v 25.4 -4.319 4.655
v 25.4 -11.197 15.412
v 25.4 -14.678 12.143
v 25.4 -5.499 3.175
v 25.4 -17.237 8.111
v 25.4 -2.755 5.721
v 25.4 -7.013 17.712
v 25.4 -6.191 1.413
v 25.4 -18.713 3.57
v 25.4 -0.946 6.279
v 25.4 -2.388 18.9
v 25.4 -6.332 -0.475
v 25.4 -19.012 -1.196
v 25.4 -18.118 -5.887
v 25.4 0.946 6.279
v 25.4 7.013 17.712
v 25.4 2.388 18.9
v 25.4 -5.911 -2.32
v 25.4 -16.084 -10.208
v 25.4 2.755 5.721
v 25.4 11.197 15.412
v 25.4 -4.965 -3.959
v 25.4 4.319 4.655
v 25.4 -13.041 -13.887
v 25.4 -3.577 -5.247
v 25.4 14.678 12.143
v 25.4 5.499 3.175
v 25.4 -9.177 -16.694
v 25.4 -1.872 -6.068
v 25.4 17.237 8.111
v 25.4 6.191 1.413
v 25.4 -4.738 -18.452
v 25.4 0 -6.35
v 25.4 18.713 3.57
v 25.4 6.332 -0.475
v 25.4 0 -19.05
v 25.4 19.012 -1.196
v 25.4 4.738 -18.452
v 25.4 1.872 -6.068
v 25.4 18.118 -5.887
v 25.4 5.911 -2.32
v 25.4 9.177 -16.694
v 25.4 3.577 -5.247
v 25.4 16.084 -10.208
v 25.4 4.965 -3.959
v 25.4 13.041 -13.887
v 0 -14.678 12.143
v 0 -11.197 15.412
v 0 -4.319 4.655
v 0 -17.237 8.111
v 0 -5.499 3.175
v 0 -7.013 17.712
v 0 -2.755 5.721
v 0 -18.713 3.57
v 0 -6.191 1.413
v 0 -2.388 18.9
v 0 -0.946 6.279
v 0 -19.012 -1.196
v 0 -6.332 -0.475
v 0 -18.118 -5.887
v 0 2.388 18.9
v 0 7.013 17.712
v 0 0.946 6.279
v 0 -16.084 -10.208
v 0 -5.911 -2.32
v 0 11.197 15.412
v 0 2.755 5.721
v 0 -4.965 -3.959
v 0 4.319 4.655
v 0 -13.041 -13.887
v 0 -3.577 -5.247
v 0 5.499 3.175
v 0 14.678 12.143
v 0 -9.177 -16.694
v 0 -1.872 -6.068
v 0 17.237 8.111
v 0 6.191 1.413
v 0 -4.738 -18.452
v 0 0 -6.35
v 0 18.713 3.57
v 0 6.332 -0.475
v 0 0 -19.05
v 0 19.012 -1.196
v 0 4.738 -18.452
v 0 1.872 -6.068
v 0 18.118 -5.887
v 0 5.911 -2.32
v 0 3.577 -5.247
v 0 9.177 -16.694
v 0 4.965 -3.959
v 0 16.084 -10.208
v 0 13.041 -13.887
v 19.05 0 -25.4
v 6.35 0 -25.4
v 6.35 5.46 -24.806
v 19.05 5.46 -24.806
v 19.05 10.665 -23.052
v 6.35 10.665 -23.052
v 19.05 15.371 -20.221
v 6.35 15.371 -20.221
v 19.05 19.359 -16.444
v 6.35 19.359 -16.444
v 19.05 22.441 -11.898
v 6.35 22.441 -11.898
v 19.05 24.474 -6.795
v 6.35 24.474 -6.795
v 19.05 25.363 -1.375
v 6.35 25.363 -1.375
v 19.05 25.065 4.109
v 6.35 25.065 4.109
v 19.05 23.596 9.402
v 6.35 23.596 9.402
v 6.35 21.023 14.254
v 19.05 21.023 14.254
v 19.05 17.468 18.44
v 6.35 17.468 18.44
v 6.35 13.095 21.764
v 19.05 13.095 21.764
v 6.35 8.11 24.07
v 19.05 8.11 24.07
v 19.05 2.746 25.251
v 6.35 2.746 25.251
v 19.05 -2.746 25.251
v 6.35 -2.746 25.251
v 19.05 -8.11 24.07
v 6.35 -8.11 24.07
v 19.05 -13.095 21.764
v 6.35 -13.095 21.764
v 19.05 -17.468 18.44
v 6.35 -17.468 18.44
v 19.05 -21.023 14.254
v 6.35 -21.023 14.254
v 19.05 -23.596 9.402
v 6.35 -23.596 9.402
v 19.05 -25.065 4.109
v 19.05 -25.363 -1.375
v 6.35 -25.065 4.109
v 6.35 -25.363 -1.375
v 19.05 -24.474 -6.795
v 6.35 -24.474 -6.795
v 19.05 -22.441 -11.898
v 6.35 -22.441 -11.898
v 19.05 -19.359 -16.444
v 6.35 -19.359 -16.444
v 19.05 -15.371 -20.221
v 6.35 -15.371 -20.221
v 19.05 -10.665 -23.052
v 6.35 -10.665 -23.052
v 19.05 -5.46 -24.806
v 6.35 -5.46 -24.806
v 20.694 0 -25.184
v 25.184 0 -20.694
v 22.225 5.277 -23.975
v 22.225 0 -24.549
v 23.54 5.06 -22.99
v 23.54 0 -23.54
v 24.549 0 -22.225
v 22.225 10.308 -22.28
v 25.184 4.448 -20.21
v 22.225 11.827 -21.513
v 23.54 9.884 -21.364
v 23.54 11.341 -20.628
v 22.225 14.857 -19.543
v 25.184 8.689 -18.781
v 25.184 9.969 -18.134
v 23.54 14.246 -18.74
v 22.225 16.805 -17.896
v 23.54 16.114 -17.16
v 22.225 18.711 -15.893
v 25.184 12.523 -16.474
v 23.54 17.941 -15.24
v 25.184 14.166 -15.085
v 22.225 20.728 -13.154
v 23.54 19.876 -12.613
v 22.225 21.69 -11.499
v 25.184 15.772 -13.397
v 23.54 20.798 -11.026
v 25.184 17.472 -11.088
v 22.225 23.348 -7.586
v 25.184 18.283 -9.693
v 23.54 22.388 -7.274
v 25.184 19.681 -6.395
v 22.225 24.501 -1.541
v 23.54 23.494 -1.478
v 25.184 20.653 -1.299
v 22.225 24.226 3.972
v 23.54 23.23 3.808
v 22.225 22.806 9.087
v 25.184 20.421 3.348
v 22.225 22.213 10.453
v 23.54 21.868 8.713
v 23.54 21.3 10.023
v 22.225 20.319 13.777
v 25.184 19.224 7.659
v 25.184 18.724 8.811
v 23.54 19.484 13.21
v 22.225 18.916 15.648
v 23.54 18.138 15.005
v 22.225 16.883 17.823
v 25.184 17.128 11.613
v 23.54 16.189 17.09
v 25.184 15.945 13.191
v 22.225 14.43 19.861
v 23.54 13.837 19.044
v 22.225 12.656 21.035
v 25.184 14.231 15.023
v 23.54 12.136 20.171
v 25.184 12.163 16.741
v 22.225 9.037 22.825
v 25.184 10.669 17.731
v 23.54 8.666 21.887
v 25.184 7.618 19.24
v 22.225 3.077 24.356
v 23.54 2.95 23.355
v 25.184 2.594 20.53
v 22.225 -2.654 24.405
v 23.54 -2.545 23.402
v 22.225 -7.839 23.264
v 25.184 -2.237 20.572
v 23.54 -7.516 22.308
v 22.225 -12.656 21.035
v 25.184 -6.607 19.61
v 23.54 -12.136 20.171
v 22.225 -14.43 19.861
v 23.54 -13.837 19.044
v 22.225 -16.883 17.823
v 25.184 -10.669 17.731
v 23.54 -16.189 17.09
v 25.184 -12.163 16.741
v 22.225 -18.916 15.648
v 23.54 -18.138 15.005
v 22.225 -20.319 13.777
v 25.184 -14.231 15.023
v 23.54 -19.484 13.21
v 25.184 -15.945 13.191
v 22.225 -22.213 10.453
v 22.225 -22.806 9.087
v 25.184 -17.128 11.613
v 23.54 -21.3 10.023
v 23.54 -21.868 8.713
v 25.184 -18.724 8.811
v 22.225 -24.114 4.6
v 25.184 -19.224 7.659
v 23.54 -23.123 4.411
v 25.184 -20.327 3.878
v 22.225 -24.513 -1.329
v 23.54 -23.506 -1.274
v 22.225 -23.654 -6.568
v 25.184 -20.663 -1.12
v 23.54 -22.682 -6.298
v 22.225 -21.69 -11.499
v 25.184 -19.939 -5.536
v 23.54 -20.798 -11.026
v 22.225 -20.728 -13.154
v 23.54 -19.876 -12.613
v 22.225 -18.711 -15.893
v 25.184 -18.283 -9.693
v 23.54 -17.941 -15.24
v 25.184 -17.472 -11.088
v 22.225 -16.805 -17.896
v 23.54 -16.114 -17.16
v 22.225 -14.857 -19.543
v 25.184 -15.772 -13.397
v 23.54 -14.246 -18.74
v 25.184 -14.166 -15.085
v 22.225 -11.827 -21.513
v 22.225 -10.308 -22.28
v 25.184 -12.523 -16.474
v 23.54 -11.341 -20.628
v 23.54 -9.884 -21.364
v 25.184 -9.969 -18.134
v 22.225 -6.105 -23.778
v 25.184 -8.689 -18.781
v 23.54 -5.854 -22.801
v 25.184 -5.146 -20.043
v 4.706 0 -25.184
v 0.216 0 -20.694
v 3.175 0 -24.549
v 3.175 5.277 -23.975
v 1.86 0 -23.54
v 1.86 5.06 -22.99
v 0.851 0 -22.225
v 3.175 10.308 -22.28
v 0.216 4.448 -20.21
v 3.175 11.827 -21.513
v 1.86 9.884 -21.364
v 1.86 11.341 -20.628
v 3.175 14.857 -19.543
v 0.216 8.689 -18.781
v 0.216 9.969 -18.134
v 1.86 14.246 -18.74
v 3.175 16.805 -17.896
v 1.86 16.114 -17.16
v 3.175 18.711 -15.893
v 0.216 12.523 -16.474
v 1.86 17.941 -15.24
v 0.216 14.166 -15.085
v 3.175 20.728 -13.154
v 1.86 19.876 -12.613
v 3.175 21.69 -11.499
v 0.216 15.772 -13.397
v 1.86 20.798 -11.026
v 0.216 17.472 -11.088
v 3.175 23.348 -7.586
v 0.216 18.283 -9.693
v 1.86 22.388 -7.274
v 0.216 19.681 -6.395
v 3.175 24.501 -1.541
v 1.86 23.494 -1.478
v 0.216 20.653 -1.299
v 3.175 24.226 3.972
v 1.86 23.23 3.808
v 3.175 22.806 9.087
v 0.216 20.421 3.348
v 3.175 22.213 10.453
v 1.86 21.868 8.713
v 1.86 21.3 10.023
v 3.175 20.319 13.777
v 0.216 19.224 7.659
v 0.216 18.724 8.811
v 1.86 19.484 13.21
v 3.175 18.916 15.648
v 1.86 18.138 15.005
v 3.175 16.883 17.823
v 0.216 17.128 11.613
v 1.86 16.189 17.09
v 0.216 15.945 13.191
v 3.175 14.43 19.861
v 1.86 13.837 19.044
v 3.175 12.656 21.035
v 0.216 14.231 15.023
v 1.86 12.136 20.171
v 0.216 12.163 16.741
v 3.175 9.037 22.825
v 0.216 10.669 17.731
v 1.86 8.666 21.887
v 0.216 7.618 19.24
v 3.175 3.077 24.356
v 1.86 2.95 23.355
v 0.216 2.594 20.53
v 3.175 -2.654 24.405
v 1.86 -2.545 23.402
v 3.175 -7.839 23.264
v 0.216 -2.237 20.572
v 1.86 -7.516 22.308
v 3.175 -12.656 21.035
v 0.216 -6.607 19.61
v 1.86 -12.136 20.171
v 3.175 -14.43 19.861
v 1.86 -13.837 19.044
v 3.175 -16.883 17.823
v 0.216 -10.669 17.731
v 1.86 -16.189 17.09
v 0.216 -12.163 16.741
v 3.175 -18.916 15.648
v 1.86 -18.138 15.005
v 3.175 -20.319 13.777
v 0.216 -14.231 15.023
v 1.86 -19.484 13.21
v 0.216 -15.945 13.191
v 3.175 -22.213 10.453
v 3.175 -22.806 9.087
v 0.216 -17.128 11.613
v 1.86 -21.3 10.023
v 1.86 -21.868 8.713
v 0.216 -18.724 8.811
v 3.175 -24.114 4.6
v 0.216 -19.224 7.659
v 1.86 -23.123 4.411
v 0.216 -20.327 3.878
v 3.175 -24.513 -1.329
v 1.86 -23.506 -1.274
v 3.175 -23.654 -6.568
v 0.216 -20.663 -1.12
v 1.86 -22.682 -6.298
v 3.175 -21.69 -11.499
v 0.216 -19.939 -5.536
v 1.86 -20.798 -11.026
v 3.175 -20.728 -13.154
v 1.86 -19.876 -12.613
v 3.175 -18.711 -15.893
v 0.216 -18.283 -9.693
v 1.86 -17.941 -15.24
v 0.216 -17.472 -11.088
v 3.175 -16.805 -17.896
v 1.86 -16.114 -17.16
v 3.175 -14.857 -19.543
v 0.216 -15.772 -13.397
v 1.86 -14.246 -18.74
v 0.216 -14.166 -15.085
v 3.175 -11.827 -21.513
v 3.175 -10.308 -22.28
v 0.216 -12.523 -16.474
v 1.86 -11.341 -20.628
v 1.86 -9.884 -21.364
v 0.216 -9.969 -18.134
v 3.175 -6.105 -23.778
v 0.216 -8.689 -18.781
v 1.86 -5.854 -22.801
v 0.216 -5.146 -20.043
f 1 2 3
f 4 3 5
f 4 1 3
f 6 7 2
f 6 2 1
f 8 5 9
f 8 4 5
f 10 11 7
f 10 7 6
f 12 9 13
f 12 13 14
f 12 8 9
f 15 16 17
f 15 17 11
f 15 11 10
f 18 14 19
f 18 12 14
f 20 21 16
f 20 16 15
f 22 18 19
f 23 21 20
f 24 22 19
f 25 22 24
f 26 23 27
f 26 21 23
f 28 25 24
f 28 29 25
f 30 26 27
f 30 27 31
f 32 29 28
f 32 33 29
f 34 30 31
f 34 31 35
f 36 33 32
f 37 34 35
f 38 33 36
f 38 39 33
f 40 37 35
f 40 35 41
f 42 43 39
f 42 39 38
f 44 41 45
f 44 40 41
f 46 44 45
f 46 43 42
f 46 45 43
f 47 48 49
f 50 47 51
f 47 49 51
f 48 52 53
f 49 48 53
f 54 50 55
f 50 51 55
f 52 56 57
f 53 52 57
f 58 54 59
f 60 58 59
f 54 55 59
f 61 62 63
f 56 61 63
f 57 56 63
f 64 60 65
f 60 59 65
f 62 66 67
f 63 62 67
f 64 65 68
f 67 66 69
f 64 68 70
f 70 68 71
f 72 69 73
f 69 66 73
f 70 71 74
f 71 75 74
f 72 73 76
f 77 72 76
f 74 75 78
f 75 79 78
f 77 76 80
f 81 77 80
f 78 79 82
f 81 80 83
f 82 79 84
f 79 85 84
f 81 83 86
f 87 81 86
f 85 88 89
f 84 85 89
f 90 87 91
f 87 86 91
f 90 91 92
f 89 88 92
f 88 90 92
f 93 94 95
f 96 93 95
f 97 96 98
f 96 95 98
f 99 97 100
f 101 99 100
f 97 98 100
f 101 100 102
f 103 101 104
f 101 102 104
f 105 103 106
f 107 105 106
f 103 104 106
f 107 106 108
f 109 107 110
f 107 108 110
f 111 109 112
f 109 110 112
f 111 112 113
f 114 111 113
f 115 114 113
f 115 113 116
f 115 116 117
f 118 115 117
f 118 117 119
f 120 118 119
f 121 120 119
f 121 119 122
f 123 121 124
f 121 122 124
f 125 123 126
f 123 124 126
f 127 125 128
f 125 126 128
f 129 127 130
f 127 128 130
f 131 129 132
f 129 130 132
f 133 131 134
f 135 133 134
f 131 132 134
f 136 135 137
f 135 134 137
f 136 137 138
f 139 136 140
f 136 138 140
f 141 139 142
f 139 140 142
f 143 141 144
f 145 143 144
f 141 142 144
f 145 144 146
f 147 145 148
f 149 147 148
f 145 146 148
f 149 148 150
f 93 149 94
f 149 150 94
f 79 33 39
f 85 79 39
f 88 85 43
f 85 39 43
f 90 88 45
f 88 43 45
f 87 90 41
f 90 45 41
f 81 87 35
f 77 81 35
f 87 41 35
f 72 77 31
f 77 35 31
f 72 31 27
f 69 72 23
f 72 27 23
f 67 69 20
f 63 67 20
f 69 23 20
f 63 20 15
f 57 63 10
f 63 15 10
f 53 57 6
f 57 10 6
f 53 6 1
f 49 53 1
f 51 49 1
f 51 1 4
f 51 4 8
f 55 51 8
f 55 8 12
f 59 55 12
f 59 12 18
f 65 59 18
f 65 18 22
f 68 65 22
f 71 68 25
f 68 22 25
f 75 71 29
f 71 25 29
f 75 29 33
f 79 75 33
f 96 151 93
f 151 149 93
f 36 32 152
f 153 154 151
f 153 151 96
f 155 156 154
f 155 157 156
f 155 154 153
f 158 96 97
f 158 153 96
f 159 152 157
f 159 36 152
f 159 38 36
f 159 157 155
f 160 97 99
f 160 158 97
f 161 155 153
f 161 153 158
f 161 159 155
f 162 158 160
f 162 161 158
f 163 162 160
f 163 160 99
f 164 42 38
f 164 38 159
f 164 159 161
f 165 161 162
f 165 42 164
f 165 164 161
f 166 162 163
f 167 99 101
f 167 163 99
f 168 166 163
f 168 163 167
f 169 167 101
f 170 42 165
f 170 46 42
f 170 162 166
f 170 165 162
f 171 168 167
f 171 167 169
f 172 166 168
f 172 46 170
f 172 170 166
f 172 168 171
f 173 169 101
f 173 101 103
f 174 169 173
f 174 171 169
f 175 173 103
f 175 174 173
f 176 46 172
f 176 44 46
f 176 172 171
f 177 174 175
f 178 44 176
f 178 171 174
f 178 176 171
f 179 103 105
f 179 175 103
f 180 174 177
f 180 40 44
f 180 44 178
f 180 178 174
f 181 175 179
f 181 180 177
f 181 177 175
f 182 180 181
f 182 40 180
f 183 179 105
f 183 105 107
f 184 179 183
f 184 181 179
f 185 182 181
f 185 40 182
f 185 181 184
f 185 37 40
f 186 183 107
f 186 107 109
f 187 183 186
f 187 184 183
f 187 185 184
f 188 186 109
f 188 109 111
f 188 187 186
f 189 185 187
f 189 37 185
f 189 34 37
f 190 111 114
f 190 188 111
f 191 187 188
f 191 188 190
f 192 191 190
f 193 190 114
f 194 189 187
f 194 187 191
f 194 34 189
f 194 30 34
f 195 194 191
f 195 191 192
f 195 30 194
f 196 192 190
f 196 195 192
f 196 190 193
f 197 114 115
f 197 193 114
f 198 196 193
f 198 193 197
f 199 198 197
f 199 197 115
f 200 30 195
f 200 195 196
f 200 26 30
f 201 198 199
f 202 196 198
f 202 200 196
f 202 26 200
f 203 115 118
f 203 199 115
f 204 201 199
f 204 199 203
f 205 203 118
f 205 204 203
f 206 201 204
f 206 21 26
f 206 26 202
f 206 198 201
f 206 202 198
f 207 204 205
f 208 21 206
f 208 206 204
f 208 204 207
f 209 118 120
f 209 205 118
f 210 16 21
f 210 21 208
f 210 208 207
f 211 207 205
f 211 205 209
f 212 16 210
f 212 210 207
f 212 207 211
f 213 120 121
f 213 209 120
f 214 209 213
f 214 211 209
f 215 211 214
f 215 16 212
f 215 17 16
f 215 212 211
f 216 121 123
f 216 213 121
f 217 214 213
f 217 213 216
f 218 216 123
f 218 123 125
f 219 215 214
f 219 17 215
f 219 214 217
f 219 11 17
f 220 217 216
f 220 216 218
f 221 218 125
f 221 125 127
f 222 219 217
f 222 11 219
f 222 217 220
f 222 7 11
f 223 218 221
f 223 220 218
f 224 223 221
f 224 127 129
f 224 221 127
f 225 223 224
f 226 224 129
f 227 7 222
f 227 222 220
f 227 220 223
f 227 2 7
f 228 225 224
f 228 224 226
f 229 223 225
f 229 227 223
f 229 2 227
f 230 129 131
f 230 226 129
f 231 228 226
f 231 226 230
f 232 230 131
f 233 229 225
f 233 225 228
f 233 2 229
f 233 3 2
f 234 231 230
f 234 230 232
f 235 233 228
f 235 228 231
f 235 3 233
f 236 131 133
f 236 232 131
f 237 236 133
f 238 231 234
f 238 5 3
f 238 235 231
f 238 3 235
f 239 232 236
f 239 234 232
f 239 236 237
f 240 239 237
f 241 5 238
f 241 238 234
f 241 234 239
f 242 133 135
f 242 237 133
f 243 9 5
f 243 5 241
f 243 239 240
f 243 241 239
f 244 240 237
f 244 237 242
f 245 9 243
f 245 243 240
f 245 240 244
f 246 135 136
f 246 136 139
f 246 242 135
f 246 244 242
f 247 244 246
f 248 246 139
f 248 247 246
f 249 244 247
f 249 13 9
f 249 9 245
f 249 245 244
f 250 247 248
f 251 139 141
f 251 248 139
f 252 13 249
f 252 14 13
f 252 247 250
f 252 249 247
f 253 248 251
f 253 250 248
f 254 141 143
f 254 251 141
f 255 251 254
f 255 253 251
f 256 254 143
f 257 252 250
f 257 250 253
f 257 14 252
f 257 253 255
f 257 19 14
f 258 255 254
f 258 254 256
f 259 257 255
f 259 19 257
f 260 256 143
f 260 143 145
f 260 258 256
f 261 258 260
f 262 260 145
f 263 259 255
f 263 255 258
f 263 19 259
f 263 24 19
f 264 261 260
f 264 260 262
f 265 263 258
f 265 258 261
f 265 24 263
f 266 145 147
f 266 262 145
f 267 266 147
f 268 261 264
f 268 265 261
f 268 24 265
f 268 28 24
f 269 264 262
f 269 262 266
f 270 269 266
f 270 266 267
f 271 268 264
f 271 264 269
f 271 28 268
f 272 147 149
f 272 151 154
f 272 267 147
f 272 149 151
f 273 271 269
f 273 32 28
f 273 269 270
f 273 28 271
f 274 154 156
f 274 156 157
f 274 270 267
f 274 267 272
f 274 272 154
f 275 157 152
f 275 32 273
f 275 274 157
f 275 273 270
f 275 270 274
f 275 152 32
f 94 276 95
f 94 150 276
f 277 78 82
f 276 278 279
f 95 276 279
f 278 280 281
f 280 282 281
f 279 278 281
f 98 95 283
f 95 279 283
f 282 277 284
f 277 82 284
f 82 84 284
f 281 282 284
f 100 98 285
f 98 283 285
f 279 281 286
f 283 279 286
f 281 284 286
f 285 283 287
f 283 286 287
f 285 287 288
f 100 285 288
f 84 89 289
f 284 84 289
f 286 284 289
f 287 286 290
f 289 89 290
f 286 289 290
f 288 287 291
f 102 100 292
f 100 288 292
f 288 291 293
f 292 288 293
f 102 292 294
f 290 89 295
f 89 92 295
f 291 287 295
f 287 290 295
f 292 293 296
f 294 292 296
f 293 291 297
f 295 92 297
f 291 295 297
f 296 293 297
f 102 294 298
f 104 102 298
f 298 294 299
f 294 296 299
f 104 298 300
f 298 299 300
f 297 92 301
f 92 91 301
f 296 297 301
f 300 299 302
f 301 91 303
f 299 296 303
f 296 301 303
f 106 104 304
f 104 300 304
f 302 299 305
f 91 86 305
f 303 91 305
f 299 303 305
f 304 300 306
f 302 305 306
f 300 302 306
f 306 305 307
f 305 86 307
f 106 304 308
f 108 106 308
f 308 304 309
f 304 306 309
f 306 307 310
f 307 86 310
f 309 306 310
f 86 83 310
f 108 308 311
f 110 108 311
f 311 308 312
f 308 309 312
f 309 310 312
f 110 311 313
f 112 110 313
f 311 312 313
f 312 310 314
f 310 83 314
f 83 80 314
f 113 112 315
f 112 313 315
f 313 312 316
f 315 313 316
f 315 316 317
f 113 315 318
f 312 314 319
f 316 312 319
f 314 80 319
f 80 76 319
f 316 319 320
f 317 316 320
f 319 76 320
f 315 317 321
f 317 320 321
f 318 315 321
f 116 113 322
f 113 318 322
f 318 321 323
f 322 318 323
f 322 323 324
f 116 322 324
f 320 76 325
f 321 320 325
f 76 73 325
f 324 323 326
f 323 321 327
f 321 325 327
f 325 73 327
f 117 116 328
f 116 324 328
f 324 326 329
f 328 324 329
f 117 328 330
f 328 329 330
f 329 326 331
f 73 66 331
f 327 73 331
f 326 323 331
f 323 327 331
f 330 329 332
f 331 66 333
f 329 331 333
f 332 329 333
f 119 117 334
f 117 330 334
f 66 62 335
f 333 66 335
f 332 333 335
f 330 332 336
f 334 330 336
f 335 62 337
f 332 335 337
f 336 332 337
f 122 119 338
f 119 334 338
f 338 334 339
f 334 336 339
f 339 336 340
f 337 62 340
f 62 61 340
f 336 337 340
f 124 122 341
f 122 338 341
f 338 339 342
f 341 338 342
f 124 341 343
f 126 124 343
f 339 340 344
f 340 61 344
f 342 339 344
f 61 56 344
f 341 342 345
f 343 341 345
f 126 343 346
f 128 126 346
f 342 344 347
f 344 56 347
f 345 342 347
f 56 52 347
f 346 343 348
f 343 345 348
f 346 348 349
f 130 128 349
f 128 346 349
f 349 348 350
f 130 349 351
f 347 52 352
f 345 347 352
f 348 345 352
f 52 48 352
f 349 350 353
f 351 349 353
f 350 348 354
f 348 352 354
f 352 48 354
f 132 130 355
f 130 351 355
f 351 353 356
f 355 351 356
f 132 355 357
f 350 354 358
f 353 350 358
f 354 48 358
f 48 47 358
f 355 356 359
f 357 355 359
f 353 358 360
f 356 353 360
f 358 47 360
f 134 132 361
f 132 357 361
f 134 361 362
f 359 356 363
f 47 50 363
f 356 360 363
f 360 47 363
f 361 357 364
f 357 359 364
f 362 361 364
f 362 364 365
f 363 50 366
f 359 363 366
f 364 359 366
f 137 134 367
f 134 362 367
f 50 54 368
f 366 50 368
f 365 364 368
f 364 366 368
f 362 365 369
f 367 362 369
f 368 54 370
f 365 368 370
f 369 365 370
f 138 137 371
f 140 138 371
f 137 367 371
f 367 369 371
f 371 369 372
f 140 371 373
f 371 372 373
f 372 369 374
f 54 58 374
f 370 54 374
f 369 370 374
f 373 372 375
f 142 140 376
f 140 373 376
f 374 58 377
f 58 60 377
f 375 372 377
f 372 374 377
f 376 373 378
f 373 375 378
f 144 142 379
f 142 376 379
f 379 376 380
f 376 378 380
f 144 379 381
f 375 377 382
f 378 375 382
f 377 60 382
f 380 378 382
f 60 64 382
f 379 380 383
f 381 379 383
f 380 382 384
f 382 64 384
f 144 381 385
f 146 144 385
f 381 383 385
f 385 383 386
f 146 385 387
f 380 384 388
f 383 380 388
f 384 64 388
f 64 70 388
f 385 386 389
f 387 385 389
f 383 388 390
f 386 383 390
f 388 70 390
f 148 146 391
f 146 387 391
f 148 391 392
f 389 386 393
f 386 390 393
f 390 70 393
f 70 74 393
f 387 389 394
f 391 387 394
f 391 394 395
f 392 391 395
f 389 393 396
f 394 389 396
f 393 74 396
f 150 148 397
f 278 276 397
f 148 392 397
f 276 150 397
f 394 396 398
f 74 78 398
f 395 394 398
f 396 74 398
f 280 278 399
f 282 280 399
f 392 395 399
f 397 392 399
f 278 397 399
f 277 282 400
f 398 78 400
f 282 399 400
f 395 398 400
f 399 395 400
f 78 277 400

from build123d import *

# Parameters (mm, degrees)
SKETCH2_R           = 25.4
BOSS_EXTRUDE1_DEPTH = 25.4
FILLET1_R           = 6.35
SKETCH3_R           = 6.35
CUT_EXTRUDE1_DEPTH  = 25.4


with BuildPart() as part:
    # Sketch2 → Boss-Extrude1 (new body)
    with BuildSketch(Plane(origin=(0, 0, 0), x_dir=(0, 0, -1), z_dir=(1, 0, 0))):
        Circle(SKETCH2_R)
    extrude(amount=BOSS_EXTRUDE1_DEPTH)

    # Fillet1
    fillet1_edges = [part.edges().sort_by_distance(p)[0] for p in [
        (0, 0, 25.4),
        (25.4, 0, 25.4),
    ]]
    fillet(fillet1_edges, radius=FILLET1_R)

    # Sketch3 → Cut-Extrude1 (cut)
    with BuildSketch(Plane(origin=(25.4, 0, 0), x_dir=(0, 0, -1), z_dir=(1, 0, 0))):
        Circle(SKETCH3_R)
    extrude(amount=-CUT_EXTRUDE1_DEPTH, mode=Mode.SUBTRACT)


solid = part.part
